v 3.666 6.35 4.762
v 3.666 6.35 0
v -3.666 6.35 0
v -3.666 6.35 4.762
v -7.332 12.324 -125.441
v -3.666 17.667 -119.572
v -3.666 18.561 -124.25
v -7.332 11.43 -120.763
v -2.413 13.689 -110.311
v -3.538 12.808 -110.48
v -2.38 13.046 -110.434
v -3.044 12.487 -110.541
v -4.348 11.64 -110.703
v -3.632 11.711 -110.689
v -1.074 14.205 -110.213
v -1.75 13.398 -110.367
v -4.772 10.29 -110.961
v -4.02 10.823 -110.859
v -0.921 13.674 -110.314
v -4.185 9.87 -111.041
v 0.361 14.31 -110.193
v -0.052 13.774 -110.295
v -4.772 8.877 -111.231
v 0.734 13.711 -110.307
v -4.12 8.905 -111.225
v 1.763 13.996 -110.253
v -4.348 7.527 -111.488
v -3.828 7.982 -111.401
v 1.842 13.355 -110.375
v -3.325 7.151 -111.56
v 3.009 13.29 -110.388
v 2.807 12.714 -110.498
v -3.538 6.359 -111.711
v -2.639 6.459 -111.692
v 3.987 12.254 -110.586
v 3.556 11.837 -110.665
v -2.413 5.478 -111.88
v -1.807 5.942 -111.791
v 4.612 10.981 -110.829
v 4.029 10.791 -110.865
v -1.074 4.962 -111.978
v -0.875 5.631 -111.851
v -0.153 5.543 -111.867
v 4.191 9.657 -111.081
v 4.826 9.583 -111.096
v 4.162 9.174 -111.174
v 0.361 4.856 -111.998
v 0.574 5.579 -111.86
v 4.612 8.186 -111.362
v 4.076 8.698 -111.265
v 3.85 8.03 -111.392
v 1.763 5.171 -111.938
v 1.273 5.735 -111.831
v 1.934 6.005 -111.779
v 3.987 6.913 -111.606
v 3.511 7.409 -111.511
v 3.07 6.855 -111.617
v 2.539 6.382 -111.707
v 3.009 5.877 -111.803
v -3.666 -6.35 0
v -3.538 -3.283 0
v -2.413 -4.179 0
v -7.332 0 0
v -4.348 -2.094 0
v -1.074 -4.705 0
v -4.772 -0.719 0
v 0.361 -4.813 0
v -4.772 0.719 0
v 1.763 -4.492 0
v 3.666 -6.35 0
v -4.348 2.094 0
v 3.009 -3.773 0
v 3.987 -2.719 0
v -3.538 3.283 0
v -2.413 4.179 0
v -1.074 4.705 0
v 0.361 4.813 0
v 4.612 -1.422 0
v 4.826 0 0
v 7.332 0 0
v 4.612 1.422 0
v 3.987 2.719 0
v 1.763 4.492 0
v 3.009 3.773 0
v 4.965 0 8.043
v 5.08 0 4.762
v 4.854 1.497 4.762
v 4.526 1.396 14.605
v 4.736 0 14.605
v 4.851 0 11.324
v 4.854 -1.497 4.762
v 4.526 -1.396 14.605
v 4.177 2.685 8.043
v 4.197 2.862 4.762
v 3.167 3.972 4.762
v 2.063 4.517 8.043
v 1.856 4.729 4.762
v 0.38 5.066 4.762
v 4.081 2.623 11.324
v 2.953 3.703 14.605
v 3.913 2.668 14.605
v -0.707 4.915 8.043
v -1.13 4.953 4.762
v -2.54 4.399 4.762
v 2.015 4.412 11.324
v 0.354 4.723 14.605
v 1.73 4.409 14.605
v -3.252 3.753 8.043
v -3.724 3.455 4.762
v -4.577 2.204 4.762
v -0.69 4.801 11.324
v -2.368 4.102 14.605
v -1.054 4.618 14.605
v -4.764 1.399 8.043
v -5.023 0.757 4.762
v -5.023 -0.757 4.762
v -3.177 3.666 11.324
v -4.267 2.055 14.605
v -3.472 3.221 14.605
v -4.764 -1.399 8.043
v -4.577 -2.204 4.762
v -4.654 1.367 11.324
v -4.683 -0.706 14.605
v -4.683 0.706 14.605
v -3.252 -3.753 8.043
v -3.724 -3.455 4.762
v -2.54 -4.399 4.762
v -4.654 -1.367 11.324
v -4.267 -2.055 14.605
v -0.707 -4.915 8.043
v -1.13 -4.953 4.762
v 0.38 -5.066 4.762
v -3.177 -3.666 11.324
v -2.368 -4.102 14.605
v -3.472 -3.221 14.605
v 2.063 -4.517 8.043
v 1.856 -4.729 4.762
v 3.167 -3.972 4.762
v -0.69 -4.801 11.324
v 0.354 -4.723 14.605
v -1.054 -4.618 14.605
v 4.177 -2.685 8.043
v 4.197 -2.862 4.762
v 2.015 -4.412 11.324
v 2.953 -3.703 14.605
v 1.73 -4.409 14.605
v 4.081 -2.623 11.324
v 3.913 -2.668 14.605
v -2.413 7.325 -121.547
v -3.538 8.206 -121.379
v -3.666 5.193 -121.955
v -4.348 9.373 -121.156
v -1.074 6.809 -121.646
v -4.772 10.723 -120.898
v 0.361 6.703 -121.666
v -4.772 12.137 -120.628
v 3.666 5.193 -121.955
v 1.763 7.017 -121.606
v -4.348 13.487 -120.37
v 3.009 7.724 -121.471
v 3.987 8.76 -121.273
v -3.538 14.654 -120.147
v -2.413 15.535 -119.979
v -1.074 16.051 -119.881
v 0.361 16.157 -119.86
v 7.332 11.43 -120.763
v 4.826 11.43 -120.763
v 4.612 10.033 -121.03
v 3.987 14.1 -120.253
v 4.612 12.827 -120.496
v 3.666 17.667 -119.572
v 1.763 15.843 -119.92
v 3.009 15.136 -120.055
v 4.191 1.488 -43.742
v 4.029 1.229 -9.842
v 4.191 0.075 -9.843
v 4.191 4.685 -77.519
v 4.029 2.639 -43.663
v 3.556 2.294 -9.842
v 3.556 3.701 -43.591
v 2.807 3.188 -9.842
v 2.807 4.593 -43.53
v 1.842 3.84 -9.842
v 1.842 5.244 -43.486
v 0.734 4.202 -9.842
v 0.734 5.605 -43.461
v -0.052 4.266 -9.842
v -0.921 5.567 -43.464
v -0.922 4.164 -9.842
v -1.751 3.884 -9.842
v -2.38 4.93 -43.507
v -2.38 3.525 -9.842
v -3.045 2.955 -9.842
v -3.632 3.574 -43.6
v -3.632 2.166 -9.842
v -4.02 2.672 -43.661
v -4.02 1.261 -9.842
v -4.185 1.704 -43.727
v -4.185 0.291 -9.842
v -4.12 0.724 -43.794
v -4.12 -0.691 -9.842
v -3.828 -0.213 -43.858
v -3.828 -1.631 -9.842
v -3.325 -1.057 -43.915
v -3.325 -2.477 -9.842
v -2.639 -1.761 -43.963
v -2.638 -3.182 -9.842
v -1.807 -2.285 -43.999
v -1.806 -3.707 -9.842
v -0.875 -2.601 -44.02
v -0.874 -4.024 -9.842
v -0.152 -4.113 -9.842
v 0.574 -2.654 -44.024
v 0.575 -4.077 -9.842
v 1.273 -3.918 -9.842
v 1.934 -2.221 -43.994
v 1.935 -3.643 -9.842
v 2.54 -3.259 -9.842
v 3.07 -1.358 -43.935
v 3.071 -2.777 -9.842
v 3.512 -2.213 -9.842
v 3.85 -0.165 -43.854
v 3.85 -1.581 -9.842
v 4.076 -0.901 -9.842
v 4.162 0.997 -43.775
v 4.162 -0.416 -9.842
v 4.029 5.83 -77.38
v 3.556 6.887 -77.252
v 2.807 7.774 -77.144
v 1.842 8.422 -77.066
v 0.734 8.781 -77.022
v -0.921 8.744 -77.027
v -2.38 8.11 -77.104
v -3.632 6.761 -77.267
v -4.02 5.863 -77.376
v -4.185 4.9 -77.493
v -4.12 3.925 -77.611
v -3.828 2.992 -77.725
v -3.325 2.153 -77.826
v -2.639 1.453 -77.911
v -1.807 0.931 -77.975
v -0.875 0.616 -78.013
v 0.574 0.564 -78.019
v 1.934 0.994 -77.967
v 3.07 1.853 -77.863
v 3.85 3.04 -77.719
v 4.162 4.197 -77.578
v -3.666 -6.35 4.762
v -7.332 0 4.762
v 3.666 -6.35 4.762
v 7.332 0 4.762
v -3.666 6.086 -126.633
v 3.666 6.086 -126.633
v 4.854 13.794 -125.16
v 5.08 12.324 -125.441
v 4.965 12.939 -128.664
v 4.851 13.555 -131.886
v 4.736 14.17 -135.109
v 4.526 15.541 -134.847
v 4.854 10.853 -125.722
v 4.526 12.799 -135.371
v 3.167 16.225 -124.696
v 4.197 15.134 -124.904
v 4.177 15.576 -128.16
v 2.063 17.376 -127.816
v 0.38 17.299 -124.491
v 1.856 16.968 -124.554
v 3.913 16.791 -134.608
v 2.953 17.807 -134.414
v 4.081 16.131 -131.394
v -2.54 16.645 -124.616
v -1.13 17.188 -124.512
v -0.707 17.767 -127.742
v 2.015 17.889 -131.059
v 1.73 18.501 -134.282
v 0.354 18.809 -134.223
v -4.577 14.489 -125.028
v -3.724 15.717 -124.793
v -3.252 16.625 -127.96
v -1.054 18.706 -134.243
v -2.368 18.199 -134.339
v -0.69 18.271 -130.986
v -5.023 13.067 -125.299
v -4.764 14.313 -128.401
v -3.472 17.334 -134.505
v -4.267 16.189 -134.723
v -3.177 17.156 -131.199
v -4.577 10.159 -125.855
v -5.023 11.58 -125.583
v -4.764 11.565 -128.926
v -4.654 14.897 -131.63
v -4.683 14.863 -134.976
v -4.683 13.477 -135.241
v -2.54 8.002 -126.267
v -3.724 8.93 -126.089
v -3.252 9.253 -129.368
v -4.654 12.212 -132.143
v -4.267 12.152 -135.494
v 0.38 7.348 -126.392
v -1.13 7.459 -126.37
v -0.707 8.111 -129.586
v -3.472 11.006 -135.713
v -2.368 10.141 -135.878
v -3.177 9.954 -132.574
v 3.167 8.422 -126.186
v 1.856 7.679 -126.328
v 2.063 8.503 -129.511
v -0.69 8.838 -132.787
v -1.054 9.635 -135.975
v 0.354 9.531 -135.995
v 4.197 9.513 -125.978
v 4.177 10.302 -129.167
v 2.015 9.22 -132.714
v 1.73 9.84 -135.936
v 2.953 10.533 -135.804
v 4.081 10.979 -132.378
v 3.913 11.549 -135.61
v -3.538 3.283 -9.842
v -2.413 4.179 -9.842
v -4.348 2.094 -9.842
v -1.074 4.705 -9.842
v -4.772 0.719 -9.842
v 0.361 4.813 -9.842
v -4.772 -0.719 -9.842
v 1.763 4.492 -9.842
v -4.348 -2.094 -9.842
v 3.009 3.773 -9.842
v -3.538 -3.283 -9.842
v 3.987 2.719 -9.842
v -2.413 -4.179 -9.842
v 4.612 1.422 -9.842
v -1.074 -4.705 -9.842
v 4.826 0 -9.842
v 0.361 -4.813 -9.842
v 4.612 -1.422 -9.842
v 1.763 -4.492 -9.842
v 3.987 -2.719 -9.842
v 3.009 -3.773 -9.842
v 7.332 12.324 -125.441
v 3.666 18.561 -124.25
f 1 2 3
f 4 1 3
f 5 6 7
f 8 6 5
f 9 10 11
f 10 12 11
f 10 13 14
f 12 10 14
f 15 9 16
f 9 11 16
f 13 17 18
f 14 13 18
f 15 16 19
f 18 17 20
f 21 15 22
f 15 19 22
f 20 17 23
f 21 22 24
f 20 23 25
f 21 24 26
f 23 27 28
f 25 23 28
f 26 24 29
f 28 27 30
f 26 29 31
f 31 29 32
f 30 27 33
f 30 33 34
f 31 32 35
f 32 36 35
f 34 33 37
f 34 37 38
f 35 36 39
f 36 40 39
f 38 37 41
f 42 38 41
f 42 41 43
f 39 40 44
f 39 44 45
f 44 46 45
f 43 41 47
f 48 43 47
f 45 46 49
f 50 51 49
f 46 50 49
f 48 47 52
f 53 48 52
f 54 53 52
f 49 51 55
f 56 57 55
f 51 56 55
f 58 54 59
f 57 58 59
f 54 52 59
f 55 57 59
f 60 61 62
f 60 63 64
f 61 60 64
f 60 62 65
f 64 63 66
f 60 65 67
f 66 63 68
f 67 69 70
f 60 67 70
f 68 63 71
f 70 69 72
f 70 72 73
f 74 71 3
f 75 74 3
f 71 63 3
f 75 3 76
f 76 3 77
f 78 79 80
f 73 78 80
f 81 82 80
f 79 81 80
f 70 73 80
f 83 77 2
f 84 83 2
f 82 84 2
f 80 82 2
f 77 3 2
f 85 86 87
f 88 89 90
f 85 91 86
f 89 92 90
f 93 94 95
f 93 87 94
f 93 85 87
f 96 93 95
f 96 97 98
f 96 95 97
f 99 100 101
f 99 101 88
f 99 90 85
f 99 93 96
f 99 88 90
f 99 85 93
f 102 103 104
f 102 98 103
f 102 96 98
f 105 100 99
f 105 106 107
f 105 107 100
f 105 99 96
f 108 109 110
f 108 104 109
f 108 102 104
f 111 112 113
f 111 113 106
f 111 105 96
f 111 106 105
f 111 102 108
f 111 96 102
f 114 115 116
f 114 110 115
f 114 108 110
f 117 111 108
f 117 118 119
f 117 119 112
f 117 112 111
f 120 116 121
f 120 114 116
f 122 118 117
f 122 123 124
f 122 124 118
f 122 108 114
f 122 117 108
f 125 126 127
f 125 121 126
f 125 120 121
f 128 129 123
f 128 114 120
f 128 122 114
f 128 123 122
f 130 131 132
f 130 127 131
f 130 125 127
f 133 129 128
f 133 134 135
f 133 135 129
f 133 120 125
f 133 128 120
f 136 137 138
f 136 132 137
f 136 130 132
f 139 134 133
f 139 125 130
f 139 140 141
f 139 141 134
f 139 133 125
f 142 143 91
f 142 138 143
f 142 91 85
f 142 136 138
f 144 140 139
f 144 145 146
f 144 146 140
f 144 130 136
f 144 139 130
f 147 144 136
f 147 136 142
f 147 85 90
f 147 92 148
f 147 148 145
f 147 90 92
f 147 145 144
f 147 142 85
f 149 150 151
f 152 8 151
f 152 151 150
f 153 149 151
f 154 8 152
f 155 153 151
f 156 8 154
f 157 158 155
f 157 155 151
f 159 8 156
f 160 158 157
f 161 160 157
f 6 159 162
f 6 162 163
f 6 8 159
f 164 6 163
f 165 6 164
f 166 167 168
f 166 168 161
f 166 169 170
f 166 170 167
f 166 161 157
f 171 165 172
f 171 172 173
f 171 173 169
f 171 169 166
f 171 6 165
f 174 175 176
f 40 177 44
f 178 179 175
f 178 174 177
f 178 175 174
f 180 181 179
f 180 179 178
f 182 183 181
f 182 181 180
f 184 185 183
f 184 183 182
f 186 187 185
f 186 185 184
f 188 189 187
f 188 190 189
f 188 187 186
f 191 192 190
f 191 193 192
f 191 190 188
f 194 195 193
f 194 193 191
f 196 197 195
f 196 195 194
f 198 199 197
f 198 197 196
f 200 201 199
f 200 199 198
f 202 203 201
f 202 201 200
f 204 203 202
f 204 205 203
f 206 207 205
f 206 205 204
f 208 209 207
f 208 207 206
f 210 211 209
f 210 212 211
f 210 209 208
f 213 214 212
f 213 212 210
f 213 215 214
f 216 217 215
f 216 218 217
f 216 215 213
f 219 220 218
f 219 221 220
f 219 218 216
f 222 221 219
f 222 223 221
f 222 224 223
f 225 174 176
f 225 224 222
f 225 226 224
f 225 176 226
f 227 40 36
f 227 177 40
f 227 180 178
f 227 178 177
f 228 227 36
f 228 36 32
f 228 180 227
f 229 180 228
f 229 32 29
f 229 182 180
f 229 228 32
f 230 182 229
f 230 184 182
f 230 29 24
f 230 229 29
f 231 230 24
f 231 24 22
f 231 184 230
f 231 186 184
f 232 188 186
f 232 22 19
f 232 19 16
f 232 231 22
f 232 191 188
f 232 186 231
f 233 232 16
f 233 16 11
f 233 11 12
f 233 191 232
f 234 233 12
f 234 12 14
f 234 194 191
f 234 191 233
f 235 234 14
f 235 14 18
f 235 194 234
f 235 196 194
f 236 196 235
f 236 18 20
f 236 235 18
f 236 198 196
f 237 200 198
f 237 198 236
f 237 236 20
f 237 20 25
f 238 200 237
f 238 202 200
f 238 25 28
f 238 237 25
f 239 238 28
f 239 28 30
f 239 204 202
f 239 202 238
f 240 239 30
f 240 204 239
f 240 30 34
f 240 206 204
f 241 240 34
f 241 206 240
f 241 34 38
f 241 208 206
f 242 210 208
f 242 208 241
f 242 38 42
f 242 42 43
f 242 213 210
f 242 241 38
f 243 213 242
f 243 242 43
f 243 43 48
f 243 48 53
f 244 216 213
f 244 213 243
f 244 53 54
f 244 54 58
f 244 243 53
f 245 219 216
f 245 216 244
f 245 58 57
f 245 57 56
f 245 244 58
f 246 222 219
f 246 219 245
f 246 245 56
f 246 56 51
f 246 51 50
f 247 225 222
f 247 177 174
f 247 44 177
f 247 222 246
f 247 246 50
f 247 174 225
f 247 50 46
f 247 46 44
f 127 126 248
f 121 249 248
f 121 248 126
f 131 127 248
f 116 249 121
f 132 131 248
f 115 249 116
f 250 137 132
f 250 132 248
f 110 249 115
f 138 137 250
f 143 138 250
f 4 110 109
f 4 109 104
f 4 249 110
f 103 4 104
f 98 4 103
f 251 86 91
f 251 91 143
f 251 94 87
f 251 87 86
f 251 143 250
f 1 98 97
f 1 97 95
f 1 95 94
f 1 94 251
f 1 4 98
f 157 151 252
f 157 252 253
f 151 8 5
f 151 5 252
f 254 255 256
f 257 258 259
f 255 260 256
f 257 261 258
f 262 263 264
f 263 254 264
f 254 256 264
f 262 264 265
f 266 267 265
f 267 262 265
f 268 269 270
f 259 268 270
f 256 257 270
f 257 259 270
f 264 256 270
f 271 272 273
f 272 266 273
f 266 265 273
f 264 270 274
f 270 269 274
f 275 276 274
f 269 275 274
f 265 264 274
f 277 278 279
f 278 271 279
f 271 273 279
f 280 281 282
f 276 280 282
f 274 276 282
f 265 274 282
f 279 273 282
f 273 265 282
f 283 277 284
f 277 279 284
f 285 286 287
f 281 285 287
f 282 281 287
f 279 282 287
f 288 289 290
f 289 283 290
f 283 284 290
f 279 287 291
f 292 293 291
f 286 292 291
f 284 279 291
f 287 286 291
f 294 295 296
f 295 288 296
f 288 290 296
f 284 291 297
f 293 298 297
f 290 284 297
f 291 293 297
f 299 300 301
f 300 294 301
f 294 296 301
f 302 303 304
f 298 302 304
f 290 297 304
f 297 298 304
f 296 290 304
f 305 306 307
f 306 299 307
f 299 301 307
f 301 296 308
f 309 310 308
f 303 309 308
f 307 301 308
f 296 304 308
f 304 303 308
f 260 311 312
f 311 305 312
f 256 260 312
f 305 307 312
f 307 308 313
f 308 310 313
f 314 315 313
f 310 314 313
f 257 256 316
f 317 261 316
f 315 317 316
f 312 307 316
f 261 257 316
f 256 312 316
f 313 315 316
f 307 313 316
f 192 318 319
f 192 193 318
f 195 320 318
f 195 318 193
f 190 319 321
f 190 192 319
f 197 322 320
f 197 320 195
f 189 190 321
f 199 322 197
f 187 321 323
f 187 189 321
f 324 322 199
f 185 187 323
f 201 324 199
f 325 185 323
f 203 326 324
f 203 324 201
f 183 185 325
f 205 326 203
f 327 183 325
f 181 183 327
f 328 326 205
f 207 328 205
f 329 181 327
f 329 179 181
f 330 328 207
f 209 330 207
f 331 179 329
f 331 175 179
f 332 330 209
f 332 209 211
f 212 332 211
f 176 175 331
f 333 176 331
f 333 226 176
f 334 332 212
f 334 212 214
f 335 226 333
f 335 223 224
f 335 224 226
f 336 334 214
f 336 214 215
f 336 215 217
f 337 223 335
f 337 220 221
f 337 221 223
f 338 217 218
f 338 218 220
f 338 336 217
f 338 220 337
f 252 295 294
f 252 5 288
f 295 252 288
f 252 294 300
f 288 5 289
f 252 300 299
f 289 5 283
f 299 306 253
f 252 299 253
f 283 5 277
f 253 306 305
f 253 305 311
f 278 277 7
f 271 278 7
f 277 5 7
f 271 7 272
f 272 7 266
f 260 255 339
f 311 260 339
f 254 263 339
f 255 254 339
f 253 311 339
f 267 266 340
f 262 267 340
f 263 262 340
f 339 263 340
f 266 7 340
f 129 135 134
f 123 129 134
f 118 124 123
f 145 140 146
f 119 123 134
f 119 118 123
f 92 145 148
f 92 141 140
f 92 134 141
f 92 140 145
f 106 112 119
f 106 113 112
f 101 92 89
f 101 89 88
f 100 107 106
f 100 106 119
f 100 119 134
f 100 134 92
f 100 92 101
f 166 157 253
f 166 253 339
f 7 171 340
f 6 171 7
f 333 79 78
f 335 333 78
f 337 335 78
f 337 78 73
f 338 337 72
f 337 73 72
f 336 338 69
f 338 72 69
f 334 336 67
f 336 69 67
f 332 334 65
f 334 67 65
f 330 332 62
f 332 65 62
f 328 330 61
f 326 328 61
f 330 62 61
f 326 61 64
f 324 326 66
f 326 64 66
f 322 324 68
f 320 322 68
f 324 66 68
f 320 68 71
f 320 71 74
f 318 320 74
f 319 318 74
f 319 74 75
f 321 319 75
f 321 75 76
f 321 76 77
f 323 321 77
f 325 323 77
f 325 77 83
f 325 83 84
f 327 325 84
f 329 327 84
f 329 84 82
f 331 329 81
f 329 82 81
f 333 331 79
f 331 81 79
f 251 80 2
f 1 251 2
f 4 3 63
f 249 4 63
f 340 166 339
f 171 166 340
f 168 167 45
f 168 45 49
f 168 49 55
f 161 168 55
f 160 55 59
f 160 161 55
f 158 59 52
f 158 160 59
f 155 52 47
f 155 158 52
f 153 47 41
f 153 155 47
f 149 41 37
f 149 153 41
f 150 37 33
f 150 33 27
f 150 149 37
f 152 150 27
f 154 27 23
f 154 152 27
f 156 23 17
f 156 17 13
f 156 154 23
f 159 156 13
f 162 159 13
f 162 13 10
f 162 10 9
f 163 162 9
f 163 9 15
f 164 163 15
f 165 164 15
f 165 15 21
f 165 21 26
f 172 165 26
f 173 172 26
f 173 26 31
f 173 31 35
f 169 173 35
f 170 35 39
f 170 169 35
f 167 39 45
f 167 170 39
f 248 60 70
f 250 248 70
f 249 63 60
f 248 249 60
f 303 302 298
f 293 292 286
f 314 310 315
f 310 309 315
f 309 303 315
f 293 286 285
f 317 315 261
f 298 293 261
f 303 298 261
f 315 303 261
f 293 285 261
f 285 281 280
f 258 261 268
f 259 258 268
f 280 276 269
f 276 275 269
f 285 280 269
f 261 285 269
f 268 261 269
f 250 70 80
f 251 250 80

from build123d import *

# Parameters (mm, degrees)
SKETCH2_R           = 4.191
BOSS_EXTRUDE1_DEPTH = 4.7625
SKETCH4_R           = 5.08
BOSS_EXTRUDE2_DEPTH = 9.8425
BOSS_EXTRUDE2_TAPER = 2
SKETCH6_R           = 4.826
BOSS_EXTRUDE3_DEPTH = 9.8425


with BuildPart() as part:
    # Sweep1: sweep along a path in Sketch1
    with BuildLine(Plane(origin=(0, 0, 0), x_dir=(0, 0, -1), z_dir=(1, 0, 0))) as sweep1_path:
        ThreePointArc((0, 0), (60.651495576, 2.863871037), (120.763284, 11.43))
    # Sketch2 → Sweep1 (sweep)
    with BuildSketch(Plane.XY):
        Circle(SKETCH2_R)
    sweep(path=sweep1_path.line)

    # Sketch3 → Boss-Extrude1 (add)
    with BuildSketch(Plane.XY):
        Polygon((7.332348419, 0), (3.666174209, 6.35), (-3.666174209, 6.35), (-7.332348419, 0), (-3.666174209, -6.35), (3.666174209, -6.35), align=None)
    boss_extrude1 = extrude(amount=BOSS_EXTRUDE1_DEPTH)

    # Sketch4 → Boss-Extrude2 (add)
    with BuildSketch(Plane.XY.offset(4.7625)):
        Circle(SKETCH4_R)
    boss_extrude2 = extrude(amount=BOSS_EXTRUDE2_DEPTH, taper=BOSS_EXTRUDE2_TAPER)

    # Sketch6 → Boss-Extrude3 (add)
    with BuildSketch(Plane(origin=(0, 0, 0), x_dir=(-1, 0, 0), z_dir=(0, 0, -1))):
        with Locations(Location((0, 0, 0), (0, 0, 180))):
            Circle(SKETCH6_R)
    boss_extrude3 = extrude(amount=BOSS_EXTRUDE3_DEPTH)

    # Mirror1: Boss-Extrude1, Boss-Extrude2, Boss-Extrude3 across plane
    add(boss_extrude1.mirror(Plane(origin=(0, 5.715, -60.381642), x_dir=(1, 0, 0), z_dir=(0, 0.09422686028954569, -0.9955507514938526))))
    add(boss_extrude2.mirror(Plane(origin=(0, 5.715, -60.381642), x_dir=(1, 0, 0), z_dir=(0, 0.09422686028954569, -0.9955507514938526))))
    add(boss_extrude3.mirror(Plane(origin=(0, 5.715, -60.381642), x_dir=(1, 0, 0), z_dir=(0, 0.09422686028954569, -0.9955507514938526))))


solid = part.part
